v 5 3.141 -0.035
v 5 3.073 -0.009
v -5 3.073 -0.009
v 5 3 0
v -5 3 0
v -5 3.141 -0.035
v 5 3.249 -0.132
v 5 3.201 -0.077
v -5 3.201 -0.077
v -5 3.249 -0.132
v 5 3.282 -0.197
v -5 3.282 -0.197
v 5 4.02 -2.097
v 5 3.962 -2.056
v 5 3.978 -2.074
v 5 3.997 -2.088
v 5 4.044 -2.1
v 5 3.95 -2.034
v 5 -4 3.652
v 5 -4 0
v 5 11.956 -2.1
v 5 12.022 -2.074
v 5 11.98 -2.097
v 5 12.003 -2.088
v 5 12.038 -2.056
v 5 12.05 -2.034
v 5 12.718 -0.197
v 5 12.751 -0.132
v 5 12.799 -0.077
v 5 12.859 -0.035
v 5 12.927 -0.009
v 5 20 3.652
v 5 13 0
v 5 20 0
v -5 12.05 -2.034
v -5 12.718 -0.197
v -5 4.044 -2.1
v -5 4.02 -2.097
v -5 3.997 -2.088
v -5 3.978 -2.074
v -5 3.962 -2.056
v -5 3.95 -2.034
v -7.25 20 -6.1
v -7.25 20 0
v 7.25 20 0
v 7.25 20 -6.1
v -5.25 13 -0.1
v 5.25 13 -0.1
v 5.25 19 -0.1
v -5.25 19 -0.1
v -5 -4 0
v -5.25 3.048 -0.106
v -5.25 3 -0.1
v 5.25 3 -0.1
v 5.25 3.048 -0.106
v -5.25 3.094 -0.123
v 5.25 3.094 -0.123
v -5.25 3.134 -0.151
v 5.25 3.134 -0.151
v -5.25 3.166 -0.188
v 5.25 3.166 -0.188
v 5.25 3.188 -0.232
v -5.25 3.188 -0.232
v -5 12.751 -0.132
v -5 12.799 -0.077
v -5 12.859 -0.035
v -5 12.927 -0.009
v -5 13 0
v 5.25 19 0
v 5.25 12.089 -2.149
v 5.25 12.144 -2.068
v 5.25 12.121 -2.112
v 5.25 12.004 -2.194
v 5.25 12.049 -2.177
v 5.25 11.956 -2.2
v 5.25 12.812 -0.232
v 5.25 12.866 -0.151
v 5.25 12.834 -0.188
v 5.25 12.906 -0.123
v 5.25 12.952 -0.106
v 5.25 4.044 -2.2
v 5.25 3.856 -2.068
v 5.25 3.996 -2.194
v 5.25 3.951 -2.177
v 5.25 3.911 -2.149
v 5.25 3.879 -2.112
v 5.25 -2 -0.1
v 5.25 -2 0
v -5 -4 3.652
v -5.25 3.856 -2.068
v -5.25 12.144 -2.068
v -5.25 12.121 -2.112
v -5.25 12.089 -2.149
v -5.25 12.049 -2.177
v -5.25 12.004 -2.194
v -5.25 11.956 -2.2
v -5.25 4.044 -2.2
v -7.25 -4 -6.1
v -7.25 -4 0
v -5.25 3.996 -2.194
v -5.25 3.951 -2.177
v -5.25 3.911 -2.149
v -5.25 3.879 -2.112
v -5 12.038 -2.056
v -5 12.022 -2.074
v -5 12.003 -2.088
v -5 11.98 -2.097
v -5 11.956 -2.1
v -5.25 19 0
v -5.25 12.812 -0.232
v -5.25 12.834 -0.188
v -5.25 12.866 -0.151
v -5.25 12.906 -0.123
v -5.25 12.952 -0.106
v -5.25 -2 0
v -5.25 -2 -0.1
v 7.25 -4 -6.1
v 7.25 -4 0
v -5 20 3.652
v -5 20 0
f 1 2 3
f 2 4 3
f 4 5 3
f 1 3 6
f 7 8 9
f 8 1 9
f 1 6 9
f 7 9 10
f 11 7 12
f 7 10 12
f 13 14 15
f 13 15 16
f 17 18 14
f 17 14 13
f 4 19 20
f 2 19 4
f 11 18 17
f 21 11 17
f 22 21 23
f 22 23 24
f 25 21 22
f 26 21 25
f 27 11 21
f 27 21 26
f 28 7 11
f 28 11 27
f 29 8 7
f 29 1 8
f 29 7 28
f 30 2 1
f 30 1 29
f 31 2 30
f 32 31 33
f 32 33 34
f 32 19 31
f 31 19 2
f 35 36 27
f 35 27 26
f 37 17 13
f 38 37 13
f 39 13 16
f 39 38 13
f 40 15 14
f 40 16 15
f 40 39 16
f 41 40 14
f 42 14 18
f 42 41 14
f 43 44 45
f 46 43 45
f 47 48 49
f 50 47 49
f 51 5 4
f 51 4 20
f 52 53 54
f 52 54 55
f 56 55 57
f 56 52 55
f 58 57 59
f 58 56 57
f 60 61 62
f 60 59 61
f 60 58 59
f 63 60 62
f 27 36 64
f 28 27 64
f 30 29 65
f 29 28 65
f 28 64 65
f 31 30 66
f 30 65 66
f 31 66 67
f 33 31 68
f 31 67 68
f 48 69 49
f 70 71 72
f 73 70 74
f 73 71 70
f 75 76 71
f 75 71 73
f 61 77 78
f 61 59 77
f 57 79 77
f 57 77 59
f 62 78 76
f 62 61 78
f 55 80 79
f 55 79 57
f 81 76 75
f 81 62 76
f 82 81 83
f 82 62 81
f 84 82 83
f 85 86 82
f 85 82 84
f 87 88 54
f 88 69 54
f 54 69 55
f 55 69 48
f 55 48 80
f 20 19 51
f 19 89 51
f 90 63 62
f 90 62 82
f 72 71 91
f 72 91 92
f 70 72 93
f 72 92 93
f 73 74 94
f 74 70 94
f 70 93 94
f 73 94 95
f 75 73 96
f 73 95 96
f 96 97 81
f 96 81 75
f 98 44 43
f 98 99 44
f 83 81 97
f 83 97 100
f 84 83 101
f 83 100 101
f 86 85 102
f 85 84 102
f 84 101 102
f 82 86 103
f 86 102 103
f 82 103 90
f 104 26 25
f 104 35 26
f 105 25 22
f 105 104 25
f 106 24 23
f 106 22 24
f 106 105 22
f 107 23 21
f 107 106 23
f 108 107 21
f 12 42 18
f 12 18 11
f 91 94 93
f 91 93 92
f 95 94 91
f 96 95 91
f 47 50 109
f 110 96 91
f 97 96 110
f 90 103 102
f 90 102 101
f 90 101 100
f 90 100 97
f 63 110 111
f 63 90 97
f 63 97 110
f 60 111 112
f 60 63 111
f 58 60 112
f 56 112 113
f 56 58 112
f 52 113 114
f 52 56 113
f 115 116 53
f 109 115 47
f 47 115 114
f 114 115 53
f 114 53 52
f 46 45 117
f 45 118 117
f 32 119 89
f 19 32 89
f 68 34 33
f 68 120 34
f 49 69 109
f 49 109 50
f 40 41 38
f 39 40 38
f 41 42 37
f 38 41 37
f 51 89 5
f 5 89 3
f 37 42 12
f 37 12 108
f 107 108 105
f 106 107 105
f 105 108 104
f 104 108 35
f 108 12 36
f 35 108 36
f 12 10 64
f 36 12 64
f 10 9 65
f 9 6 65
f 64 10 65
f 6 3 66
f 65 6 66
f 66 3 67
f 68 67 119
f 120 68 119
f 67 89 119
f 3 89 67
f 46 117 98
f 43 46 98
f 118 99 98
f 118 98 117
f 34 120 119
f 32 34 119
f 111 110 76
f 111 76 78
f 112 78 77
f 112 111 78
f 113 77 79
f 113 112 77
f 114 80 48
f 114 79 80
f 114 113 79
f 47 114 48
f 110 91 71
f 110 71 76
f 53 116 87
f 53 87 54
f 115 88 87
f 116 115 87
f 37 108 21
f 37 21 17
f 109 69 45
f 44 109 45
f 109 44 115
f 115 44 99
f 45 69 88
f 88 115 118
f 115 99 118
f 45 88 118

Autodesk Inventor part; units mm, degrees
ref_plane "YZ Plane" through (0, 0, 0) normal (1, 0, 0) x (0, 1, 0)
ref_plane "XZ Plane" through (0, 0, 0) normal (0, 1, 0) x (-1, 0, 0)
ref_plane "XY Plane" through (0, 0, 0) normal (0, 0, 1) x (1, 0, 0)
sketch "Skizze3" plane through (0, 0, 0) normal (1, 0, 0) x (0, 1, 0)
  line L0 (3, -0.1) -> (3, 0)
  line L1 (3, 0) -> (0, 0)
  line L2 (0, 0) -> (0, -0.1)
  line L3 (0, -0.1) -> (3, -0.1)
  line L4 (3, -0.1) -> (3, 0)
  arc A0 (3.1879, -0.2316) -> (3, -0.1) centre (3, -0.3) ccw
  line L5 (3.1879, -0.2316) -> (3.2819, -0.1974)
  arc A1 (3.2819, -0.1974) -> (3, 0) centre (3, -0.3) ccw
  line L6 (3.1879, -0.2316) -> (3.2819, -0.1974)
  line L7 (3.1879, -0.2316) -> (3.8565, -2.0684)
  line L8 (3.8565, -2.0684) -> (3.9505, -2.0342)
  line L9 (3.9505, -2.0342) -> (3.2819, -0.1974)
  line L10 (3.8565, -2.0684) -> (3.9505, -2.0342)
  arc A2 (3.8565, -2.0684) -> (4.0444, -2.2) centre (4.0444, -2) ccw
  line L11 (4.0444, -2.2) -> (4.0444, -2.1)
  arc A3 (3.9505, -2.0342) -> (4.0444, -2.1) centre (4.0444, -2) ccw
  line L12 (4.0444, -2.2) -> (11.9556, -2.2)
  line L13 (4.0444, -2.2) -> (4.0444, -2.1)
  line L14 (4.0444, -2.2) -> (11.9556, -2.2)
  line L15 (11.9556, -2.2) -> (11.9556, -2.1)
  line L16 (11.9556, -2.1) -> (4.0444, -2.1)
  line L17 (11.9556, -2.2) -> (11.9556, -2.1)
  arc A4 (11.9556, -2.2) -> (12.1435, -2.0684) centre (11.9556, -2) ccw
  line L18 (12.1435, -2.0684) -> (12.0495, -2.0342)
  arc A5 (11.9556, -2.1) -> (12.0495, -2.0342) centre (11.9556, -2) ccw
  line L19 (12.1435, -2.0684) -> (12.0495, -2.0342)
  line L20 (12.1435, -2.0684) -> (12.8121, -0.2316)
  line L21 (12.8121, -0.2316) -> (12.7181, -0.1974)
  line L22 (12.7181, -0.1974) -> (12.0495, -2.0342)
  line L23 (12.8121, -0.2316) -> (12.7181, -0.1974)
  arc A6 (13, -0.1) -> (12.8121, -0.2316) centre (13, -0.3) ccw
  line L24 (13, -0.1) -> (13, 0)
  arc A7 (13, 0) -> (12.7181, -0.1974) centre (13, -0.3) ccw
  line L25 (13, -0.1) -> (13, 0)
  line L26 (13, -0.1) -> (16, -0.1)
  line L27 (16, 0) -> (16, -0.1)
  line L28 (16, 0) -> (13, 0)
  line L29 (0, -0.1) -> (-4, -0.1)
  line L30 (-4, -0.1) -> (-4, -6.1)
  line L31 (-4, -6.1) -> (20, -6.1)
  line L32 (20, -6.1) -> (20, -0.1)
  line L33 (16, -0.1) -> (20, -0.1)
  line L34 (-4, 0) -> (-2, 0)
  line L35 (-2, 0) -> (-2, -0.1)
  line L36 (-2, -0.1) -> (-4, -0.1)
  line L37 (-4, -0.1) -> (-4, 0)
  line L38 (19, -0.1) -> (20, -0.1)
  line L39 (20, -0.1) -> (20, 0)
  line L40 (20, 0) -> (19, 0)
  line L41 (19, 0) -> (19, -0.1)
  line L42 (20, 0) -> (20, 3.6516)
  line L43 (20, 3.6516) -> (-4, 3.6516)
  line L44 (-4, 3.6516) -> (-4, -0.1)
  line L45 (16, 0) -> (19, 0)
  line L46 (-2, 0) -> (0, 0)
  point P0 (16, -0.1)
  point P1 (8, -6.1)
  point P2 (8, -2.1)
  dimension "d13" = 24
  dimension "d14" = 6
  dimension "d17" = 2
  dimension "d18" = 0.1
  dimension "d19" = 1
  dimension "d20" = 0.1
extrude "Extrusion2" add sketch "Skizze3" along normal mid plane 10.5 contours A0 L7 A2 L12 A4 L20 A6 L26 L33 L32 L31 L30 L29 L3 | L29 L37 L34 L35 | L33 L41 L40 L39
sketch "Skizze4" plane through (-5.25, -4, -6.1) normal (0, -1, 0) x (1, 0, 0)
  line L0 (10.5, 6.1) -> (10.5, 0) projected
  line L1 (10.5, 6.1) -> (12.5, 6.1)
  line L2 (12.5, 6.1) -> (12.5, 0)
  line L3 (12.5, 0) -> (10.5, 0)
  line L4 (10.5, 0) -> (10.5, 6.1)
  line L5 (0, 6.1) -> (-2, 6.1)
  line L6 (-2, 6.1) -> (-2, 0)
  line L7 (-2, 0) -> (0, 0)
  line L8 (0, 0) -> (0, 6.1)
  point P0 (5.25, 6.1)
  dimension "d24" = 2
  dimension "d31" = 2
extrude "Extrusion3" add sketch "Skizze4" against normal up to surface (24 mm away)
extrude "Extrusion4" add sketch "Skizze3" along normal mid plane 10 separate body contours L1 L46 L34 L44 L43 L42 L40 L45 L28 A7 L22 A5 L16 A3 L9 A1
properties part number "stanzev1u_3D-Druck"
